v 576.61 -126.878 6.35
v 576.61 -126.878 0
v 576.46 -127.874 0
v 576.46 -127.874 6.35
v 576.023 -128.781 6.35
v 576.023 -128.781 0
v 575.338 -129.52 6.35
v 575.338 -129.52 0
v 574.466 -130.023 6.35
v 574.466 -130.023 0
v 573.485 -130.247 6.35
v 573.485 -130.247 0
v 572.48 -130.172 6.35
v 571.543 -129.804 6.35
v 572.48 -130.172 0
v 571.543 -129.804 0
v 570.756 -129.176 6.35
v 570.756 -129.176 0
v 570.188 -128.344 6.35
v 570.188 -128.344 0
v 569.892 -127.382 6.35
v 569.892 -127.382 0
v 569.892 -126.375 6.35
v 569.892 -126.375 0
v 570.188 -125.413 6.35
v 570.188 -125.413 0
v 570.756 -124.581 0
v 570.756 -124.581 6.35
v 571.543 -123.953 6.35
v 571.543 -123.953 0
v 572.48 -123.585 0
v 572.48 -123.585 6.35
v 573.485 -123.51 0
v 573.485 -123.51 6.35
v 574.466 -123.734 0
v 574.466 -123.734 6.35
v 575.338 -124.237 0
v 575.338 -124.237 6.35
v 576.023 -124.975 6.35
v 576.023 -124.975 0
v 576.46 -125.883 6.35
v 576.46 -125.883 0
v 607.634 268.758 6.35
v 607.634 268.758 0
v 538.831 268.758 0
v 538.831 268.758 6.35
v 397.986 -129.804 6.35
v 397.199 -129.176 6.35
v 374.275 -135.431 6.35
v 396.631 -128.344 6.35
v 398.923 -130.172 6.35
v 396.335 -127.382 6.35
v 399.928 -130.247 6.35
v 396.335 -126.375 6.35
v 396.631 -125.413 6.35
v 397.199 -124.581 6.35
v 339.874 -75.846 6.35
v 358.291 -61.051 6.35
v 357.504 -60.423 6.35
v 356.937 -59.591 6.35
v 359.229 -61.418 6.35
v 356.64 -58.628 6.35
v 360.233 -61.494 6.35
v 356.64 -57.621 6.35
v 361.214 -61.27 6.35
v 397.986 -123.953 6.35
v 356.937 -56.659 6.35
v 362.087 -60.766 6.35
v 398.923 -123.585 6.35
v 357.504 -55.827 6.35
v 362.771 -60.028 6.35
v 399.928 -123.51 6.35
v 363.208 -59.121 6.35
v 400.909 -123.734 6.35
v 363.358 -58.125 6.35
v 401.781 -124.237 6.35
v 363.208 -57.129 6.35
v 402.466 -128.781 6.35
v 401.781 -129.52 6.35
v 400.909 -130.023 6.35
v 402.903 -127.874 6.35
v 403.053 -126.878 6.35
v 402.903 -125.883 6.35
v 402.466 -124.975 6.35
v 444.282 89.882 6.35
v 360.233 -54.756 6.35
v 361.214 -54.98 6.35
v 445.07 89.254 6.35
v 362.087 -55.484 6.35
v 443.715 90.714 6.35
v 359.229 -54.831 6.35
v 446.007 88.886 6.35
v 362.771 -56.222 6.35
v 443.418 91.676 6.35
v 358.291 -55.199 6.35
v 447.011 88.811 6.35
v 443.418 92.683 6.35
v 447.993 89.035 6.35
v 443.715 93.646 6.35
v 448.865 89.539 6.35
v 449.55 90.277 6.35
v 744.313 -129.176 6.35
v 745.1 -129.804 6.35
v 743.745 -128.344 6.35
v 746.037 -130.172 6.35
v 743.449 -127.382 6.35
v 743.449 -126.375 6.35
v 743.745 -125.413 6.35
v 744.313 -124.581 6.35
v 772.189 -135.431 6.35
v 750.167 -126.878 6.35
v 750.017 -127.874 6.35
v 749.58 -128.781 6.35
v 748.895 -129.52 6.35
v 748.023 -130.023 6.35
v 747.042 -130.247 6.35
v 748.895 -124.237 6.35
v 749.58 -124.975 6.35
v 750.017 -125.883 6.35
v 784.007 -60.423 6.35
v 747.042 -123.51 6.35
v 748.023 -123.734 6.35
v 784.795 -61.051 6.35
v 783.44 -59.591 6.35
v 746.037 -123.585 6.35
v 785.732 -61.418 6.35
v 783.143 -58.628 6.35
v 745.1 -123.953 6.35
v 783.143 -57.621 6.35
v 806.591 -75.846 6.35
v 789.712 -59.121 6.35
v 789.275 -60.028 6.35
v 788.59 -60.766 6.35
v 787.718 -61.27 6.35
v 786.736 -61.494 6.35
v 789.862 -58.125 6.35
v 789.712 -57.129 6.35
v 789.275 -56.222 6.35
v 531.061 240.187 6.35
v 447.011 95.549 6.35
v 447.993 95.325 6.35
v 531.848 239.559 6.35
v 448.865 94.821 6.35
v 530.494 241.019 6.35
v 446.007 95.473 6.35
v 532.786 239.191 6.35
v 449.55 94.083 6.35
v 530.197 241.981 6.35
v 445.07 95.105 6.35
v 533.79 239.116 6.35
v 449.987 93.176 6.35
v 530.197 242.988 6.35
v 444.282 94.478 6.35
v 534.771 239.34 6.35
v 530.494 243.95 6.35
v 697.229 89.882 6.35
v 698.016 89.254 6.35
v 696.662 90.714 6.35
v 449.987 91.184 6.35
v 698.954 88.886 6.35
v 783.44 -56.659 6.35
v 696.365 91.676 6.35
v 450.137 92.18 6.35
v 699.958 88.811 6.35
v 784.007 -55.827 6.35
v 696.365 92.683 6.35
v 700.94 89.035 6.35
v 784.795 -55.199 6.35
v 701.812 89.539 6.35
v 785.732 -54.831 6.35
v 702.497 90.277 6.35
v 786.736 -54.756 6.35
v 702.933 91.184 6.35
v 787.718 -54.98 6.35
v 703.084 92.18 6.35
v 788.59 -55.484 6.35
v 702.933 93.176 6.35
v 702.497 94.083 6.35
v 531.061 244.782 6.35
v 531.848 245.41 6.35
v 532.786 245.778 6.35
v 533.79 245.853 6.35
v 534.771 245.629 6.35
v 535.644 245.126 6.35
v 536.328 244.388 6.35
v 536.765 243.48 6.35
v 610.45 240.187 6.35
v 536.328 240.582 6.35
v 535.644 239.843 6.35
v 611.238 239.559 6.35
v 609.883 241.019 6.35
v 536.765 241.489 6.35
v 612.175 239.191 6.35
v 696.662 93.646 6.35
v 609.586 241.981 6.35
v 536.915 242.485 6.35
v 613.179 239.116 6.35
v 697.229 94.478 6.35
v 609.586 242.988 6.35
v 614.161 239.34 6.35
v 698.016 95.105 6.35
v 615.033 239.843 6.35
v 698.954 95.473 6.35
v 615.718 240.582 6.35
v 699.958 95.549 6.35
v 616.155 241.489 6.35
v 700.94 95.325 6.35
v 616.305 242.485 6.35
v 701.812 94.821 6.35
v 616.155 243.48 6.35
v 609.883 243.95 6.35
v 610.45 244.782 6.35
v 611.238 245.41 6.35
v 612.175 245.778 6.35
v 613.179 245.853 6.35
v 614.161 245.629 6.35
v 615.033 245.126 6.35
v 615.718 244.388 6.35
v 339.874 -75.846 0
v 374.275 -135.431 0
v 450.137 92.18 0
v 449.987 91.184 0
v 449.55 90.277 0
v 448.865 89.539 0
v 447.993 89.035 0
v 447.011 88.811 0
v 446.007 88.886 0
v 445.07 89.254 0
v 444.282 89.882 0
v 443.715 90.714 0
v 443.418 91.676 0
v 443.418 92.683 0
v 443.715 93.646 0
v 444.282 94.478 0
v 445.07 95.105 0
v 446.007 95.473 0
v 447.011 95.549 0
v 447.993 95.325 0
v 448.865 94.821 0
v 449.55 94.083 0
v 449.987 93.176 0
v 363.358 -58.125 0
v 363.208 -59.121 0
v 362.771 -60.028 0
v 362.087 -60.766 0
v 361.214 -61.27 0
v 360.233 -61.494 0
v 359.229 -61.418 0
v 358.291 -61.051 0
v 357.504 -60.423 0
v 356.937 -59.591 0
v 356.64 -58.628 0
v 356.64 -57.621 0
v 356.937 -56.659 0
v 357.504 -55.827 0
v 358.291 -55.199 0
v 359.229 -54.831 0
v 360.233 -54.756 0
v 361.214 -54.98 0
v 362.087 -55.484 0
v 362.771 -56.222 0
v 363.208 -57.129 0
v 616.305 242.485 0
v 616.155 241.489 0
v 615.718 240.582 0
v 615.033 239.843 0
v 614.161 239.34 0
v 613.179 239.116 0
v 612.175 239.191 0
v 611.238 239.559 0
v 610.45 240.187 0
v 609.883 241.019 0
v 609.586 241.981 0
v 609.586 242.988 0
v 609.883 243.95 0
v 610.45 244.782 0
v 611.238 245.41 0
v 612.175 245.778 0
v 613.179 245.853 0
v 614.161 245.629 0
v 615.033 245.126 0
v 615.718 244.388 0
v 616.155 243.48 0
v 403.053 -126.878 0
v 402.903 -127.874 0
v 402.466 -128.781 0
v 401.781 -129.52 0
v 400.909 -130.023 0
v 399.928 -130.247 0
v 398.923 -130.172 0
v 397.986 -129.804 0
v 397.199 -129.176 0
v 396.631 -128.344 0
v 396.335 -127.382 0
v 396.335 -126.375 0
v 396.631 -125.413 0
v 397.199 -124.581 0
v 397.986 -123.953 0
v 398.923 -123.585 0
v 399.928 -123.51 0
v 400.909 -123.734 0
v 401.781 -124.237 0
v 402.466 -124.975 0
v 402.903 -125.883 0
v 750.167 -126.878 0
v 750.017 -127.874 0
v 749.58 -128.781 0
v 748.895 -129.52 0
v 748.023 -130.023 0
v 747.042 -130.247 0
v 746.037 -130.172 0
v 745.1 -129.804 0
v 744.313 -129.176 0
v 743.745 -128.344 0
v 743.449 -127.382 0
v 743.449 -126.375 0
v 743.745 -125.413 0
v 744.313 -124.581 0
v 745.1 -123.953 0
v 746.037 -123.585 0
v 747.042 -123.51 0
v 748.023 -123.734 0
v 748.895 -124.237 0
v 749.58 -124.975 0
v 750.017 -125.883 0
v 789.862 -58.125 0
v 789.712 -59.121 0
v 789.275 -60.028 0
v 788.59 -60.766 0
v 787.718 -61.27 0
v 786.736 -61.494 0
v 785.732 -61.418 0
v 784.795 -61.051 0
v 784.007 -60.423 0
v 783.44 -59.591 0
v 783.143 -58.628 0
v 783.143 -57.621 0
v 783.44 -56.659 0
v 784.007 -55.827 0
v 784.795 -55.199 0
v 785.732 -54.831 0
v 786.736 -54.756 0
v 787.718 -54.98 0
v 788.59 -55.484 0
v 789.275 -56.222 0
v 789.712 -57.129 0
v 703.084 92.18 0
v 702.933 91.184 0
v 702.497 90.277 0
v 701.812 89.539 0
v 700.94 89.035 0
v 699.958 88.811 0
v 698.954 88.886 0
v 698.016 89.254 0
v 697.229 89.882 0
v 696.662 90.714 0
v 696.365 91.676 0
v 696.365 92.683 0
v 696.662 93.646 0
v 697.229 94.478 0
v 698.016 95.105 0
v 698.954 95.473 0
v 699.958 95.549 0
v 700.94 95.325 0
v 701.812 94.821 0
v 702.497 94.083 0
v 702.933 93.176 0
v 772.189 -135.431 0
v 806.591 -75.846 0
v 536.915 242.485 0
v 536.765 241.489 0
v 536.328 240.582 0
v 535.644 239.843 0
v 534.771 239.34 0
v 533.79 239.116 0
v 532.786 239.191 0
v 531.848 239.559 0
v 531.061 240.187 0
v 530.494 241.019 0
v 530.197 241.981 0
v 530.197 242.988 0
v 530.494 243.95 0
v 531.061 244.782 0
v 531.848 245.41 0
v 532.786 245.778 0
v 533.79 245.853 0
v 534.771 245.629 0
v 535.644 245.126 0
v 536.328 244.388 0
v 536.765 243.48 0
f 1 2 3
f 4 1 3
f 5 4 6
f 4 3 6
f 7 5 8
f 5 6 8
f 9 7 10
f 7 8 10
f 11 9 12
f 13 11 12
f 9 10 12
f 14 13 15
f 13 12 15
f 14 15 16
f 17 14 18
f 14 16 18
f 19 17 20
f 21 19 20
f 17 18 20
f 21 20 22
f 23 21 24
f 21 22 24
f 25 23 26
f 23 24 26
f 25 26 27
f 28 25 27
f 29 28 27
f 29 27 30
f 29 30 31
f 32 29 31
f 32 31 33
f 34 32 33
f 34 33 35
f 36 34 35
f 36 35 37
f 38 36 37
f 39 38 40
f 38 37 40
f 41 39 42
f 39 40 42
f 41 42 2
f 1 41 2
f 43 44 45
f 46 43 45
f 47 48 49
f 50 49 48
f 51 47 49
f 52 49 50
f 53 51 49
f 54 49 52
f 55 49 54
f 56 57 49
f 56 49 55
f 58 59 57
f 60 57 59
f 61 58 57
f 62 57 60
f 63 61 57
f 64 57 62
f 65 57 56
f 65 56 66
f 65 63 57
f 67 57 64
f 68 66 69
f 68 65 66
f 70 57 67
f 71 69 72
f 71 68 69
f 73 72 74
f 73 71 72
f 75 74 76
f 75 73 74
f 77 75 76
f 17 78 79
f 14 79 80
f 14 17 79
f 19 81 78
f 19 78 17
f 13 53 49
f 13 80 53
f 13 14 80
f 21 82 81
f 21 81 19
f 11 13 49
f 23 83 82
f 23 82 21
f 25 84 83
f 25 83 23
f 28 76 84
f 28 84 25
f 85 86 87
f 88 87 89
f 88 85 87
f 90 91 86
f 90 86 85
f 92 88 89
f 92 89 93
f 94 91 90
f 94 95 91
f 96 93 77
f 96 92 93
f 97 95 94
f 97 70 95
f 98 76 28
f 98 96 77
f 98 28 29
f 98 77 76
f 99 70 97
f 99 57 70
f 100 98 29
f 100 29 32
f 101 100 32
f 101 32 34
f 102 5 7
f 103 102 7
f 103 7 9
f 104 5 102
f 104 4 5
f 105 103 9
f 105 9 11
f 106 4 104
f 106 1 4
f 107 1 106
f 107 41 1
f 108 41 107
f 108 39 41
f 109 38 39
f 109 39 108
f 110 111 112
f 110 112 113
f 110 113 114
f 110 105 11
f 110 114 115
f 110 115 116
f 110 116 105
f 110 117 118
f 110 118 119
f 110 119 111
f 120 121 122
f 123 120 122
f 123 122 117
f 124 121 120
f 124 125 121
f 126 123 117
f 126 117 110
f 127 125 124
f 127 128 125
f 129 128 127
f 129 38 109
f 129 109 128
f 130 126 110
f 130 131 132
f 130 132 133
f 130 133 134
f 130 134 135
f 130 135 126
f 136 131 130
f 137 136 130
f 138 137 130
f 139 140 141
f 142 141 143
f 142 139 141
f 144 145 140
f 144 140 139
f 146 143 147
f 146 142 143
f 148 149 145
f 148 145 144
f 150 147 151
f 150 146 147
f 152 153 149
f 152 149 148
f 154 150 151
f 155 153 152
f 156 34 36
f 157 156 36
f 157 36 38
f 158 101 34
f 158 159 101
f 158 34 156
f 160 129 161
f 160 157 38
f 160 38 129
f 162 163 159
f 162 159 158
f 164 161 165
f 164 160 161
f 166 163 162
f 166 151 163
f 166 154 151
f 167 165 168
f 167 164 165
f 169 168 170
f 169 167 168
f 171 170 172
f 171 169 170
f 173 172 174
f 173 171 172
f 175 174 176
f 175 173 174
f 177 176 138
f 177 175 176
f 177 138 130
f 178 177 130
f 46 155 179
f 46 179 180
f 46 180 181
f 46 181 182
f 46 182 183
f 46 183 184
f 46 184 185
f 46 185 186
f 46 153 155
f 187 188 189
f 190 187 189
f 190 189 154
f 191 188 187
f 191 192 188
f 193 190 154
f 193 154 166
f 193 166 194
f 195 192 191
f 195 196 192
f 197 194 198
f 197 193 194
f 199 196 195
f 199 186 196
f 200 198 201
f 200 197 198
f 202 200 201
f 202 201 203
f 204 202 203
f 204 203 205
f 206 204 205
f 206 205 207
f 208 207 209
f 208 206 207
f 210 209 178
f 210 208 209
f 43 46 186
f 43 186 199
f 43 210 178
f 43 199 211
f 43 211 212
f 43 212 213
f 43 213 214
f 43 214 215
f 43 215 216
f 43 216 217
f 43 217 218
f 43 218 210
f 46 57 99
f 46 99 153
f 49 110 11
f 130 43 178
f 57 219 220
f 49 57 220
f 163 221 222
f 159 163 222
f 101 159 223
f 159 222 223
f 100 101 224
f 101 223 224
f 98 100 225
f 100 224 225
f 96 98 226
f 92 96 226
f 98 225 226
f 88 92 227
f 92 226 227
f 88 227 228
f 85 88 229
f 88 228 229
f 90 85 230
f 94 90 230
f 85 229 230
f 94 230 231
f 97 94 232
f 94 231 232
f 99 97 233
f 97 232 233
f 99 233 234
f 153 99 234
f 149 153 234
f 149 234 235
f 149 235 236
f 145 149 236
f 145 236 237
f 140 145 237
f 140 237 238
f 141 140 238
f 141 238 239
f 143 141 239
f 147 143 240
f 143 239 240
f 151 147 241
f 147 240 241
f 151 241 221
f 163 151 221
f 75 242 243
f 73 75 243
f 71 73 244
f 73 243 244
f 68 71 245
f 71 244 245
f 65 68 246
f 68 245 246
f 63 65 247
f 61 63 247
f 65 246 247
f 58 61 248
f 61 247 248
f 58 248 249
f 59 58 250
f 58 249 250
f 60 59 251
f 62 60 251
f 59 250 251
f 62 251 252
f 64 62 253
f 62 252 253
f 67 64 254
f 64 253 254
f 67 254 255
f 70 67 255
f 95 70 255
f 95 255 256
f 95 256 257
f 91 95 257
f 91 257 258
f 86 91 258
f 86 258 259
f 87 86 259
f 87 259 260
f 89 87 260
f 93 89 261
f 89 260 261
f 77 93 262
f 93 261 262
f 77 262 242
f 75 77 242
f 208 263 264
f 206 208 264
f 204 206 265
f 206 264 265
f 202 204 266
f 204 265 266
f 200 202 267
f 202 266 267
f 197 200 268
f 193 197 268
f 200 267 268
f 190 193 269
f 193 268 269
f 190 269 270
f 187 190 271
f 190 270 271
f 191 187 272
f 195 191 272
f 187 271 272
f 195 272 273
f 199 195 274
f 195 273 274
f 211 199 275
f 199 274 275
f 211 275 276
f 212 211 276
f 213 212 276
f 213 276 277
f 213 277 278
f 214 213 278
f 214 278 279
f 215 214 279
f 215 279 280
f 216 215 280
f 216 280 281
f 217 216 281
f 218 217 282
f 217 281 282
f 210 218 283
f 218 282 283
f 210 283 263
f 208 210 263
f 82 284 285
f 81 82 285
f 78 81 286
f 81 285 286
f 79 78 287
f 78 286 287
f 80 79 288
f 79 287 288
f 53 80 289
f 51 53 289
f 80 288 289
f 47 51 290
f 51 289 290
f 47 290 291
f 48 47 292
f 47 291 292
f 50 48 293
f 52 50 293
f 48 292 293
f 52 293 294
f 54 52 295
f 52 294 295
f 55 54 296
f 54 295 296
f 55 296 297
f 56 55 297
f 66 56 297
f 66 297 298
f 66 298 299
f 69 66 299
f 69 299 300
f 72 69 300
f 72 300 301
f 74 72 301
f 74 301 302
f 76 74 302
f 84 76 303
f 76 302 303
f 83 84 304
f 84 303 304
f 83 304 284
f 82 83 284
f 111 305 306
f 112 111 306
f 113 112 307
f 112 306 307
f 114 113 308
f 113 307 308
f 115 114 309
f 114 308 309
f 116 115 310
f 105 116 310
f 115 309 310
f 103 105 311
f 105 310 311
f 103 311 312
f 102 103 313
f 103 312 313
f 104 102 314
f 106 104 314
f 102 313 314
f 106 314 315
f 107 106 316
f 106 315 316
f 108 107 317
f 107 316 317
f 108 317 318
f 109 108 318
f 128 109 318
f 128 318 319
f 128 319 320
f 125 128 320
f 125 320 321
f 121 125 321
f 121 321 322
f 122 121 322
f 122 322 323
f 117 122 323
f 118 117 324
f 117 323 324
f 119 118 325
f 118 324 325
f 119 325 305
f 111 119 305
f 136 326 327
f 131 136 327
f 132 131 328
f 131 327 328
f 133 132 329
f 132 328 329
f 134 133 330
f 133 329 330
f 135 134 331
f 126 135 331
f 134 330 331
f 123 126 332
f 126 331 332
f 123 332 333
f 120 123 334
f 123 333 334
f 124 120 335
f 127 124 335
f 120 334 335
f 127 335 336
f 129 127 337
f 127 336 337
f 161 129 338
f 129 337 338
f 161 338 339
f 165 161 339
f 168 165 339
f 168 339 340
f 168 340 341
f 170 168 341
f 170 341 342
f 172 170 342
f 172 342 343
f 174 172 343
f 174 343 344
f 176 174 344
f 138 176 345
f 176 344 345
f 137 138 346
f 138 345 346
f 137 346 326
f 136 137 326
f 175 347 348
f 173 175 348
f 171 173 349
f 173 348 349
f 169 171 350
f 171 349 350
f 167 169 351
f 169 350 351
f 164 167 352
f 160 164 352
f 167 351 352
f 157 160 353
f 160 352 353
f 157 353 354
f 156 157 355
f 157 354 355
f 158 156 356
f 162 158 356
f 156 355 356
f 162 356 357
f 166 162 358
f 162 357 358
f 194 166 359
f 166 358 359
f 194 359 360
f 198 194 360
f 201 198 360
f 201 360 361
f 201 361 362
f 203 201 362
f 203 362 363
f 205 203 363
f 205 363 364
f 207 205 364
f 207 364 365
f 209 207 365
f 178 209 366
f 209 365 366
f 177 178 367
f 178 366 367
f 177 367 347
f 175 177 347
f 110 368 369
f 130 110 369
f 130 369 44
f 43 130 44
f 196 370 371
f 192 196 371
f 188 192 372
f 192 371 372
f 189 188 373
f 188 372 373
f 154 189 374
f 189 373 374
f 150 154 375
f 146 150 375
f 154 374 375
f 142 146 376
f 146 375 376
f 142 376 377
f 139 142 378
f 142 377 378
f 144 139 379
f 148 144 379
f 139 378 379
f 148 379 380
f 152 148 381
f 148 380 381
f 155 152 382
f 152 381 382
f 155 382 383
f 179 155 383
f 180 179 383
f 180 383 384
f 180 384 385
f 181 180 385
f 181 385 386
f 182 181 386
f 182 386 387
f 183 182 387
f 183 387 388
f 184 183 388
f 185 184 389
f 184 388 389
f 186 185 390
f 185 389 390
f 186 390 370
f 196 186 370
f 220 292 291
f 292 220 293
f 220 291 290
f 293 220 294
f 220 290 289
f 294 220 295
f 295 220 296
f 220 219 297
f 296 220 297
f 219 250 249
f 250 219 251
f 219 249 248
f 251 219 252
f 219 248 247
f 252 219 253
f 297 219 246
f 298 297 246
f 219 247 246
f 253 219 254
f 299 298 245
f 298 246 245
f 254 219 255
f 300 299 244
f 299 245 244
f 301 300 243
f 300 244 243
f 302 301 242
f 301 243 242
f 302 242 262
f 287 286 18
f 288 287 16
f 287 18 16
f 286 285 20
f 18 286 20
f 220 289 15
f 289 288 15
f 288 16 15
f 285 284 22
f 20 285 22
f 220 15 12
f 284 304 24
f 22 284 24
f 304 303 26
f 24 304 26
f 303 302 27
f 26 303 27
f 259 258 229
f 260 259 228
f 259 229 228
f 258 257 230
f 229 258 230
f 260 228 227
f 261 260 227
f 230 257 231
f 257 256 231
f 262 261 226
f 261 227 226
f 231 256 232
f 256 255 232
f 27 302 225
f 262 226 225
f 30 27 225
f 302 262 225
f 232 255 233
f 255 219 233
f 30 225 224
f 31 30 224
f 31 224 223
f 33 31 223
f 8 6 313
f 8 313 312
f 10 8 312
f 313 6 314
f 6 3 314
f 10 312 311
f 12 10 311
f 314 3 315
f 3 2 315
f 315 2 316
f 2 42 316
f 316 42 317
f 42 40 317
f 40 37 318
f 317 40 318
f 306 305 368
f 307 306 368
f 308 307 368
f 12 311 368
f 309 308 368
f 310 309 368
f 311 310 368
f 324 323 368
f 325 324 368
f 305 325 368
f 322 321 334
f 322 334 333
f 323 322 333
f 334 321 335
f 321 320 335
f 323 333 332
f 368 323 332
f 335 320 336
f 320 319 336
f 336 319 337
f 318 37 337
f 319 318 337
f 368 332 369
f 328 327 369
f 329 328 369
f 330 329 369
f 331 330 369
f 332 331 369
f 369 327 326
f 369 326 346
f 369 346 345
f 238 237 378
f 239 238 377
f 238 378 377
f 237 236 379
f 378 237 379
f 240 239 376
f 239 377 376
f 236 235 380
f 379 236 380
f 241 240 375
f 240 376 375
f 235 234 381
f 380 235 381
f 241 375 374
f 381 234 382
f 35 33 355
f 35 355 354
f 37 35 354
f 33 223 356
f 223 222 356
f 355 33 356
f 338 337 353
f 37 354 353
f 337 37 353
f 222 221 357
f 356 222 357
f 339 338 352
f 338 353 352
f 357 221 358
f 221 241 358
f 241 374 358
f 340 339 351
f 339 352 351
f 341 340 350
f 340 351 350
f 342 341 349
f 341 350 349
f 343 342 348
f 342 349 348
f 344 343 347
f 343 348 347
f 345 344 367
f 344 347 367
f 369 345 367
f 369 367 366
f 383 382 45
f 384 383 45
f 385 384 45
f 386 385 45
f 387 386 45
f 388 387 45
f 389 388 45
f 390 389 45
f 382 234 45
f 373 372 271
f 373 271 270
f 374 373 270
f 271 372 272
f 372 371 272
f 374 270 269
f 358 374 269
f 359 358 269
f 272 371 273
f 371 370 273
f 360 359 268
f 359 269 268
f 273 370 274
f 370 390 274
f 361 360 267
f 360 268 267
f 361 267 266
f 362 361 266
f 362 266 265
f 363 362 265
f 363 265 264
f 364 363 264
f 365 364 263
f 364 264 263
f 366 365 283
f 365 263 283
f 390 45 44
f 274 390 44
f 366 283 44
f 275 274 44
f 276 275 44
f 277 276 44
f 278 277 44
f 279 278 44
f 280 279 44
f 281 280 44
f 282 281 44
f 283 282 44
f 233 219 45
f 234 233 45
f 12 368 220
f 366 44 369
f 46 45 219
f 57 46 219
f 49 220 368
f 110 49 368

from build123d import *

# Parameters (mm, degrees)
F1_DEPTH = 6.35


with BuildPart() as f1:
    # F0 (on Top) → F1 (new body)
    with BuildSketch(Plane.XY):
        Polygon((538.830596, 268.757908), (339.87359, -75.845721), (374.275071, -135.430819), (772.189058, -135.430819), (806.590538, -75.845721), (607.633532, 268.757908), align=None)
        with BuildLine():
            ThreePointArc((396.296871, -126.878334), (399.675071, -123.500134), (403.053271, -126.878334))
            ThreePointArc((403.053271, -126.878334), (399.675071, -130.256534), (396.296871, -126.878334))
        make_face(mode=Mode.SUBTRACT)
        with BuildLine():
            ThreePointArc((356.602055, -58.124903), (359.980255, -54.746703), (363.358455, -58.124903))
            ThreePointArc((363.358455, -58.124903), (359.980255, -61.503103), (356.602055, -58.124903))
        make_face(mode=Mode.SUBTRACT)
        with BuildLine():
            ThreePointArc((569.853877, -126.878334), (573.232077, -123.500134), (576.610277, -126.878334))
            ThreePointArc((576.610277, -126.878334), (573.232077, -130.256534), (569.853877, -126.878334))
        make_face(mode=Mode.SUBTRACT)
        with BuildLine():
            ThreePointArc((743.410858, -126.878334), (746.789058, -123.500134), (750.167258, -126.878334))
            ThreePointArc((750.167258, -126.878334), (746.789058, -130.256534), (743.410858, -126.878334))
        make_face(mode=Mode.SUBTRACT)
        with BuildLine():
            ThreePointArc((783.105673, -58.124903), (786.483873, -54.746703), (789.862073, -58.124903))
            ThreePointArc((789.862073, -58.124903), (786.483873, -61.503103), (783.105673, -58.124903))
        make_face(mode=Mode.SUBTRACT)
        with BuildLine():
            ThreePointArc((443.380571, 92.179851), (446.758771, 95.558051), (450.136971, 92.179851))
            ThreePointArc((450.136971, 92.179851), (446.758771, 88.801651), (443.380571, 92.179851))
        make_face(mode=Mode.SUBTRACT)
        with BuildLine():
            ThreePointArc((696.327157, 92.179851), (699.705357, 95.558051), (703.083557, 92.179851))
            ThreePointArc((703.083557, 92.179851), (699.705357, 88.801651), (696.327157, 92.179851))
        make_face(mode=Mode.SUBTRACT)
        with BuildLine():
            ThreePointArc((530.159062, 242.484631), (533.537262, 245.862831), (536.915462, 242.484631))
            ThreePointArc((536.915462, 242.484631), (533.537262, 239.106431), (530.159062, 242.484631))
        make_face(mode=Mode.SUBTRACT)
        with BuildLine():
            ThreePointArc((609.548667, 242.484631), (612.926867, 245.862831), (616.305067, 242.484631))
            ThreePointArc((616.305067, 242.484631), (612.926867, 239.106431), (609.548667, 242.484631))
        make_face(mode=Mode.SUBTRACT)
    extrude(amount=F1_DEPTH)


solid = f1.part
